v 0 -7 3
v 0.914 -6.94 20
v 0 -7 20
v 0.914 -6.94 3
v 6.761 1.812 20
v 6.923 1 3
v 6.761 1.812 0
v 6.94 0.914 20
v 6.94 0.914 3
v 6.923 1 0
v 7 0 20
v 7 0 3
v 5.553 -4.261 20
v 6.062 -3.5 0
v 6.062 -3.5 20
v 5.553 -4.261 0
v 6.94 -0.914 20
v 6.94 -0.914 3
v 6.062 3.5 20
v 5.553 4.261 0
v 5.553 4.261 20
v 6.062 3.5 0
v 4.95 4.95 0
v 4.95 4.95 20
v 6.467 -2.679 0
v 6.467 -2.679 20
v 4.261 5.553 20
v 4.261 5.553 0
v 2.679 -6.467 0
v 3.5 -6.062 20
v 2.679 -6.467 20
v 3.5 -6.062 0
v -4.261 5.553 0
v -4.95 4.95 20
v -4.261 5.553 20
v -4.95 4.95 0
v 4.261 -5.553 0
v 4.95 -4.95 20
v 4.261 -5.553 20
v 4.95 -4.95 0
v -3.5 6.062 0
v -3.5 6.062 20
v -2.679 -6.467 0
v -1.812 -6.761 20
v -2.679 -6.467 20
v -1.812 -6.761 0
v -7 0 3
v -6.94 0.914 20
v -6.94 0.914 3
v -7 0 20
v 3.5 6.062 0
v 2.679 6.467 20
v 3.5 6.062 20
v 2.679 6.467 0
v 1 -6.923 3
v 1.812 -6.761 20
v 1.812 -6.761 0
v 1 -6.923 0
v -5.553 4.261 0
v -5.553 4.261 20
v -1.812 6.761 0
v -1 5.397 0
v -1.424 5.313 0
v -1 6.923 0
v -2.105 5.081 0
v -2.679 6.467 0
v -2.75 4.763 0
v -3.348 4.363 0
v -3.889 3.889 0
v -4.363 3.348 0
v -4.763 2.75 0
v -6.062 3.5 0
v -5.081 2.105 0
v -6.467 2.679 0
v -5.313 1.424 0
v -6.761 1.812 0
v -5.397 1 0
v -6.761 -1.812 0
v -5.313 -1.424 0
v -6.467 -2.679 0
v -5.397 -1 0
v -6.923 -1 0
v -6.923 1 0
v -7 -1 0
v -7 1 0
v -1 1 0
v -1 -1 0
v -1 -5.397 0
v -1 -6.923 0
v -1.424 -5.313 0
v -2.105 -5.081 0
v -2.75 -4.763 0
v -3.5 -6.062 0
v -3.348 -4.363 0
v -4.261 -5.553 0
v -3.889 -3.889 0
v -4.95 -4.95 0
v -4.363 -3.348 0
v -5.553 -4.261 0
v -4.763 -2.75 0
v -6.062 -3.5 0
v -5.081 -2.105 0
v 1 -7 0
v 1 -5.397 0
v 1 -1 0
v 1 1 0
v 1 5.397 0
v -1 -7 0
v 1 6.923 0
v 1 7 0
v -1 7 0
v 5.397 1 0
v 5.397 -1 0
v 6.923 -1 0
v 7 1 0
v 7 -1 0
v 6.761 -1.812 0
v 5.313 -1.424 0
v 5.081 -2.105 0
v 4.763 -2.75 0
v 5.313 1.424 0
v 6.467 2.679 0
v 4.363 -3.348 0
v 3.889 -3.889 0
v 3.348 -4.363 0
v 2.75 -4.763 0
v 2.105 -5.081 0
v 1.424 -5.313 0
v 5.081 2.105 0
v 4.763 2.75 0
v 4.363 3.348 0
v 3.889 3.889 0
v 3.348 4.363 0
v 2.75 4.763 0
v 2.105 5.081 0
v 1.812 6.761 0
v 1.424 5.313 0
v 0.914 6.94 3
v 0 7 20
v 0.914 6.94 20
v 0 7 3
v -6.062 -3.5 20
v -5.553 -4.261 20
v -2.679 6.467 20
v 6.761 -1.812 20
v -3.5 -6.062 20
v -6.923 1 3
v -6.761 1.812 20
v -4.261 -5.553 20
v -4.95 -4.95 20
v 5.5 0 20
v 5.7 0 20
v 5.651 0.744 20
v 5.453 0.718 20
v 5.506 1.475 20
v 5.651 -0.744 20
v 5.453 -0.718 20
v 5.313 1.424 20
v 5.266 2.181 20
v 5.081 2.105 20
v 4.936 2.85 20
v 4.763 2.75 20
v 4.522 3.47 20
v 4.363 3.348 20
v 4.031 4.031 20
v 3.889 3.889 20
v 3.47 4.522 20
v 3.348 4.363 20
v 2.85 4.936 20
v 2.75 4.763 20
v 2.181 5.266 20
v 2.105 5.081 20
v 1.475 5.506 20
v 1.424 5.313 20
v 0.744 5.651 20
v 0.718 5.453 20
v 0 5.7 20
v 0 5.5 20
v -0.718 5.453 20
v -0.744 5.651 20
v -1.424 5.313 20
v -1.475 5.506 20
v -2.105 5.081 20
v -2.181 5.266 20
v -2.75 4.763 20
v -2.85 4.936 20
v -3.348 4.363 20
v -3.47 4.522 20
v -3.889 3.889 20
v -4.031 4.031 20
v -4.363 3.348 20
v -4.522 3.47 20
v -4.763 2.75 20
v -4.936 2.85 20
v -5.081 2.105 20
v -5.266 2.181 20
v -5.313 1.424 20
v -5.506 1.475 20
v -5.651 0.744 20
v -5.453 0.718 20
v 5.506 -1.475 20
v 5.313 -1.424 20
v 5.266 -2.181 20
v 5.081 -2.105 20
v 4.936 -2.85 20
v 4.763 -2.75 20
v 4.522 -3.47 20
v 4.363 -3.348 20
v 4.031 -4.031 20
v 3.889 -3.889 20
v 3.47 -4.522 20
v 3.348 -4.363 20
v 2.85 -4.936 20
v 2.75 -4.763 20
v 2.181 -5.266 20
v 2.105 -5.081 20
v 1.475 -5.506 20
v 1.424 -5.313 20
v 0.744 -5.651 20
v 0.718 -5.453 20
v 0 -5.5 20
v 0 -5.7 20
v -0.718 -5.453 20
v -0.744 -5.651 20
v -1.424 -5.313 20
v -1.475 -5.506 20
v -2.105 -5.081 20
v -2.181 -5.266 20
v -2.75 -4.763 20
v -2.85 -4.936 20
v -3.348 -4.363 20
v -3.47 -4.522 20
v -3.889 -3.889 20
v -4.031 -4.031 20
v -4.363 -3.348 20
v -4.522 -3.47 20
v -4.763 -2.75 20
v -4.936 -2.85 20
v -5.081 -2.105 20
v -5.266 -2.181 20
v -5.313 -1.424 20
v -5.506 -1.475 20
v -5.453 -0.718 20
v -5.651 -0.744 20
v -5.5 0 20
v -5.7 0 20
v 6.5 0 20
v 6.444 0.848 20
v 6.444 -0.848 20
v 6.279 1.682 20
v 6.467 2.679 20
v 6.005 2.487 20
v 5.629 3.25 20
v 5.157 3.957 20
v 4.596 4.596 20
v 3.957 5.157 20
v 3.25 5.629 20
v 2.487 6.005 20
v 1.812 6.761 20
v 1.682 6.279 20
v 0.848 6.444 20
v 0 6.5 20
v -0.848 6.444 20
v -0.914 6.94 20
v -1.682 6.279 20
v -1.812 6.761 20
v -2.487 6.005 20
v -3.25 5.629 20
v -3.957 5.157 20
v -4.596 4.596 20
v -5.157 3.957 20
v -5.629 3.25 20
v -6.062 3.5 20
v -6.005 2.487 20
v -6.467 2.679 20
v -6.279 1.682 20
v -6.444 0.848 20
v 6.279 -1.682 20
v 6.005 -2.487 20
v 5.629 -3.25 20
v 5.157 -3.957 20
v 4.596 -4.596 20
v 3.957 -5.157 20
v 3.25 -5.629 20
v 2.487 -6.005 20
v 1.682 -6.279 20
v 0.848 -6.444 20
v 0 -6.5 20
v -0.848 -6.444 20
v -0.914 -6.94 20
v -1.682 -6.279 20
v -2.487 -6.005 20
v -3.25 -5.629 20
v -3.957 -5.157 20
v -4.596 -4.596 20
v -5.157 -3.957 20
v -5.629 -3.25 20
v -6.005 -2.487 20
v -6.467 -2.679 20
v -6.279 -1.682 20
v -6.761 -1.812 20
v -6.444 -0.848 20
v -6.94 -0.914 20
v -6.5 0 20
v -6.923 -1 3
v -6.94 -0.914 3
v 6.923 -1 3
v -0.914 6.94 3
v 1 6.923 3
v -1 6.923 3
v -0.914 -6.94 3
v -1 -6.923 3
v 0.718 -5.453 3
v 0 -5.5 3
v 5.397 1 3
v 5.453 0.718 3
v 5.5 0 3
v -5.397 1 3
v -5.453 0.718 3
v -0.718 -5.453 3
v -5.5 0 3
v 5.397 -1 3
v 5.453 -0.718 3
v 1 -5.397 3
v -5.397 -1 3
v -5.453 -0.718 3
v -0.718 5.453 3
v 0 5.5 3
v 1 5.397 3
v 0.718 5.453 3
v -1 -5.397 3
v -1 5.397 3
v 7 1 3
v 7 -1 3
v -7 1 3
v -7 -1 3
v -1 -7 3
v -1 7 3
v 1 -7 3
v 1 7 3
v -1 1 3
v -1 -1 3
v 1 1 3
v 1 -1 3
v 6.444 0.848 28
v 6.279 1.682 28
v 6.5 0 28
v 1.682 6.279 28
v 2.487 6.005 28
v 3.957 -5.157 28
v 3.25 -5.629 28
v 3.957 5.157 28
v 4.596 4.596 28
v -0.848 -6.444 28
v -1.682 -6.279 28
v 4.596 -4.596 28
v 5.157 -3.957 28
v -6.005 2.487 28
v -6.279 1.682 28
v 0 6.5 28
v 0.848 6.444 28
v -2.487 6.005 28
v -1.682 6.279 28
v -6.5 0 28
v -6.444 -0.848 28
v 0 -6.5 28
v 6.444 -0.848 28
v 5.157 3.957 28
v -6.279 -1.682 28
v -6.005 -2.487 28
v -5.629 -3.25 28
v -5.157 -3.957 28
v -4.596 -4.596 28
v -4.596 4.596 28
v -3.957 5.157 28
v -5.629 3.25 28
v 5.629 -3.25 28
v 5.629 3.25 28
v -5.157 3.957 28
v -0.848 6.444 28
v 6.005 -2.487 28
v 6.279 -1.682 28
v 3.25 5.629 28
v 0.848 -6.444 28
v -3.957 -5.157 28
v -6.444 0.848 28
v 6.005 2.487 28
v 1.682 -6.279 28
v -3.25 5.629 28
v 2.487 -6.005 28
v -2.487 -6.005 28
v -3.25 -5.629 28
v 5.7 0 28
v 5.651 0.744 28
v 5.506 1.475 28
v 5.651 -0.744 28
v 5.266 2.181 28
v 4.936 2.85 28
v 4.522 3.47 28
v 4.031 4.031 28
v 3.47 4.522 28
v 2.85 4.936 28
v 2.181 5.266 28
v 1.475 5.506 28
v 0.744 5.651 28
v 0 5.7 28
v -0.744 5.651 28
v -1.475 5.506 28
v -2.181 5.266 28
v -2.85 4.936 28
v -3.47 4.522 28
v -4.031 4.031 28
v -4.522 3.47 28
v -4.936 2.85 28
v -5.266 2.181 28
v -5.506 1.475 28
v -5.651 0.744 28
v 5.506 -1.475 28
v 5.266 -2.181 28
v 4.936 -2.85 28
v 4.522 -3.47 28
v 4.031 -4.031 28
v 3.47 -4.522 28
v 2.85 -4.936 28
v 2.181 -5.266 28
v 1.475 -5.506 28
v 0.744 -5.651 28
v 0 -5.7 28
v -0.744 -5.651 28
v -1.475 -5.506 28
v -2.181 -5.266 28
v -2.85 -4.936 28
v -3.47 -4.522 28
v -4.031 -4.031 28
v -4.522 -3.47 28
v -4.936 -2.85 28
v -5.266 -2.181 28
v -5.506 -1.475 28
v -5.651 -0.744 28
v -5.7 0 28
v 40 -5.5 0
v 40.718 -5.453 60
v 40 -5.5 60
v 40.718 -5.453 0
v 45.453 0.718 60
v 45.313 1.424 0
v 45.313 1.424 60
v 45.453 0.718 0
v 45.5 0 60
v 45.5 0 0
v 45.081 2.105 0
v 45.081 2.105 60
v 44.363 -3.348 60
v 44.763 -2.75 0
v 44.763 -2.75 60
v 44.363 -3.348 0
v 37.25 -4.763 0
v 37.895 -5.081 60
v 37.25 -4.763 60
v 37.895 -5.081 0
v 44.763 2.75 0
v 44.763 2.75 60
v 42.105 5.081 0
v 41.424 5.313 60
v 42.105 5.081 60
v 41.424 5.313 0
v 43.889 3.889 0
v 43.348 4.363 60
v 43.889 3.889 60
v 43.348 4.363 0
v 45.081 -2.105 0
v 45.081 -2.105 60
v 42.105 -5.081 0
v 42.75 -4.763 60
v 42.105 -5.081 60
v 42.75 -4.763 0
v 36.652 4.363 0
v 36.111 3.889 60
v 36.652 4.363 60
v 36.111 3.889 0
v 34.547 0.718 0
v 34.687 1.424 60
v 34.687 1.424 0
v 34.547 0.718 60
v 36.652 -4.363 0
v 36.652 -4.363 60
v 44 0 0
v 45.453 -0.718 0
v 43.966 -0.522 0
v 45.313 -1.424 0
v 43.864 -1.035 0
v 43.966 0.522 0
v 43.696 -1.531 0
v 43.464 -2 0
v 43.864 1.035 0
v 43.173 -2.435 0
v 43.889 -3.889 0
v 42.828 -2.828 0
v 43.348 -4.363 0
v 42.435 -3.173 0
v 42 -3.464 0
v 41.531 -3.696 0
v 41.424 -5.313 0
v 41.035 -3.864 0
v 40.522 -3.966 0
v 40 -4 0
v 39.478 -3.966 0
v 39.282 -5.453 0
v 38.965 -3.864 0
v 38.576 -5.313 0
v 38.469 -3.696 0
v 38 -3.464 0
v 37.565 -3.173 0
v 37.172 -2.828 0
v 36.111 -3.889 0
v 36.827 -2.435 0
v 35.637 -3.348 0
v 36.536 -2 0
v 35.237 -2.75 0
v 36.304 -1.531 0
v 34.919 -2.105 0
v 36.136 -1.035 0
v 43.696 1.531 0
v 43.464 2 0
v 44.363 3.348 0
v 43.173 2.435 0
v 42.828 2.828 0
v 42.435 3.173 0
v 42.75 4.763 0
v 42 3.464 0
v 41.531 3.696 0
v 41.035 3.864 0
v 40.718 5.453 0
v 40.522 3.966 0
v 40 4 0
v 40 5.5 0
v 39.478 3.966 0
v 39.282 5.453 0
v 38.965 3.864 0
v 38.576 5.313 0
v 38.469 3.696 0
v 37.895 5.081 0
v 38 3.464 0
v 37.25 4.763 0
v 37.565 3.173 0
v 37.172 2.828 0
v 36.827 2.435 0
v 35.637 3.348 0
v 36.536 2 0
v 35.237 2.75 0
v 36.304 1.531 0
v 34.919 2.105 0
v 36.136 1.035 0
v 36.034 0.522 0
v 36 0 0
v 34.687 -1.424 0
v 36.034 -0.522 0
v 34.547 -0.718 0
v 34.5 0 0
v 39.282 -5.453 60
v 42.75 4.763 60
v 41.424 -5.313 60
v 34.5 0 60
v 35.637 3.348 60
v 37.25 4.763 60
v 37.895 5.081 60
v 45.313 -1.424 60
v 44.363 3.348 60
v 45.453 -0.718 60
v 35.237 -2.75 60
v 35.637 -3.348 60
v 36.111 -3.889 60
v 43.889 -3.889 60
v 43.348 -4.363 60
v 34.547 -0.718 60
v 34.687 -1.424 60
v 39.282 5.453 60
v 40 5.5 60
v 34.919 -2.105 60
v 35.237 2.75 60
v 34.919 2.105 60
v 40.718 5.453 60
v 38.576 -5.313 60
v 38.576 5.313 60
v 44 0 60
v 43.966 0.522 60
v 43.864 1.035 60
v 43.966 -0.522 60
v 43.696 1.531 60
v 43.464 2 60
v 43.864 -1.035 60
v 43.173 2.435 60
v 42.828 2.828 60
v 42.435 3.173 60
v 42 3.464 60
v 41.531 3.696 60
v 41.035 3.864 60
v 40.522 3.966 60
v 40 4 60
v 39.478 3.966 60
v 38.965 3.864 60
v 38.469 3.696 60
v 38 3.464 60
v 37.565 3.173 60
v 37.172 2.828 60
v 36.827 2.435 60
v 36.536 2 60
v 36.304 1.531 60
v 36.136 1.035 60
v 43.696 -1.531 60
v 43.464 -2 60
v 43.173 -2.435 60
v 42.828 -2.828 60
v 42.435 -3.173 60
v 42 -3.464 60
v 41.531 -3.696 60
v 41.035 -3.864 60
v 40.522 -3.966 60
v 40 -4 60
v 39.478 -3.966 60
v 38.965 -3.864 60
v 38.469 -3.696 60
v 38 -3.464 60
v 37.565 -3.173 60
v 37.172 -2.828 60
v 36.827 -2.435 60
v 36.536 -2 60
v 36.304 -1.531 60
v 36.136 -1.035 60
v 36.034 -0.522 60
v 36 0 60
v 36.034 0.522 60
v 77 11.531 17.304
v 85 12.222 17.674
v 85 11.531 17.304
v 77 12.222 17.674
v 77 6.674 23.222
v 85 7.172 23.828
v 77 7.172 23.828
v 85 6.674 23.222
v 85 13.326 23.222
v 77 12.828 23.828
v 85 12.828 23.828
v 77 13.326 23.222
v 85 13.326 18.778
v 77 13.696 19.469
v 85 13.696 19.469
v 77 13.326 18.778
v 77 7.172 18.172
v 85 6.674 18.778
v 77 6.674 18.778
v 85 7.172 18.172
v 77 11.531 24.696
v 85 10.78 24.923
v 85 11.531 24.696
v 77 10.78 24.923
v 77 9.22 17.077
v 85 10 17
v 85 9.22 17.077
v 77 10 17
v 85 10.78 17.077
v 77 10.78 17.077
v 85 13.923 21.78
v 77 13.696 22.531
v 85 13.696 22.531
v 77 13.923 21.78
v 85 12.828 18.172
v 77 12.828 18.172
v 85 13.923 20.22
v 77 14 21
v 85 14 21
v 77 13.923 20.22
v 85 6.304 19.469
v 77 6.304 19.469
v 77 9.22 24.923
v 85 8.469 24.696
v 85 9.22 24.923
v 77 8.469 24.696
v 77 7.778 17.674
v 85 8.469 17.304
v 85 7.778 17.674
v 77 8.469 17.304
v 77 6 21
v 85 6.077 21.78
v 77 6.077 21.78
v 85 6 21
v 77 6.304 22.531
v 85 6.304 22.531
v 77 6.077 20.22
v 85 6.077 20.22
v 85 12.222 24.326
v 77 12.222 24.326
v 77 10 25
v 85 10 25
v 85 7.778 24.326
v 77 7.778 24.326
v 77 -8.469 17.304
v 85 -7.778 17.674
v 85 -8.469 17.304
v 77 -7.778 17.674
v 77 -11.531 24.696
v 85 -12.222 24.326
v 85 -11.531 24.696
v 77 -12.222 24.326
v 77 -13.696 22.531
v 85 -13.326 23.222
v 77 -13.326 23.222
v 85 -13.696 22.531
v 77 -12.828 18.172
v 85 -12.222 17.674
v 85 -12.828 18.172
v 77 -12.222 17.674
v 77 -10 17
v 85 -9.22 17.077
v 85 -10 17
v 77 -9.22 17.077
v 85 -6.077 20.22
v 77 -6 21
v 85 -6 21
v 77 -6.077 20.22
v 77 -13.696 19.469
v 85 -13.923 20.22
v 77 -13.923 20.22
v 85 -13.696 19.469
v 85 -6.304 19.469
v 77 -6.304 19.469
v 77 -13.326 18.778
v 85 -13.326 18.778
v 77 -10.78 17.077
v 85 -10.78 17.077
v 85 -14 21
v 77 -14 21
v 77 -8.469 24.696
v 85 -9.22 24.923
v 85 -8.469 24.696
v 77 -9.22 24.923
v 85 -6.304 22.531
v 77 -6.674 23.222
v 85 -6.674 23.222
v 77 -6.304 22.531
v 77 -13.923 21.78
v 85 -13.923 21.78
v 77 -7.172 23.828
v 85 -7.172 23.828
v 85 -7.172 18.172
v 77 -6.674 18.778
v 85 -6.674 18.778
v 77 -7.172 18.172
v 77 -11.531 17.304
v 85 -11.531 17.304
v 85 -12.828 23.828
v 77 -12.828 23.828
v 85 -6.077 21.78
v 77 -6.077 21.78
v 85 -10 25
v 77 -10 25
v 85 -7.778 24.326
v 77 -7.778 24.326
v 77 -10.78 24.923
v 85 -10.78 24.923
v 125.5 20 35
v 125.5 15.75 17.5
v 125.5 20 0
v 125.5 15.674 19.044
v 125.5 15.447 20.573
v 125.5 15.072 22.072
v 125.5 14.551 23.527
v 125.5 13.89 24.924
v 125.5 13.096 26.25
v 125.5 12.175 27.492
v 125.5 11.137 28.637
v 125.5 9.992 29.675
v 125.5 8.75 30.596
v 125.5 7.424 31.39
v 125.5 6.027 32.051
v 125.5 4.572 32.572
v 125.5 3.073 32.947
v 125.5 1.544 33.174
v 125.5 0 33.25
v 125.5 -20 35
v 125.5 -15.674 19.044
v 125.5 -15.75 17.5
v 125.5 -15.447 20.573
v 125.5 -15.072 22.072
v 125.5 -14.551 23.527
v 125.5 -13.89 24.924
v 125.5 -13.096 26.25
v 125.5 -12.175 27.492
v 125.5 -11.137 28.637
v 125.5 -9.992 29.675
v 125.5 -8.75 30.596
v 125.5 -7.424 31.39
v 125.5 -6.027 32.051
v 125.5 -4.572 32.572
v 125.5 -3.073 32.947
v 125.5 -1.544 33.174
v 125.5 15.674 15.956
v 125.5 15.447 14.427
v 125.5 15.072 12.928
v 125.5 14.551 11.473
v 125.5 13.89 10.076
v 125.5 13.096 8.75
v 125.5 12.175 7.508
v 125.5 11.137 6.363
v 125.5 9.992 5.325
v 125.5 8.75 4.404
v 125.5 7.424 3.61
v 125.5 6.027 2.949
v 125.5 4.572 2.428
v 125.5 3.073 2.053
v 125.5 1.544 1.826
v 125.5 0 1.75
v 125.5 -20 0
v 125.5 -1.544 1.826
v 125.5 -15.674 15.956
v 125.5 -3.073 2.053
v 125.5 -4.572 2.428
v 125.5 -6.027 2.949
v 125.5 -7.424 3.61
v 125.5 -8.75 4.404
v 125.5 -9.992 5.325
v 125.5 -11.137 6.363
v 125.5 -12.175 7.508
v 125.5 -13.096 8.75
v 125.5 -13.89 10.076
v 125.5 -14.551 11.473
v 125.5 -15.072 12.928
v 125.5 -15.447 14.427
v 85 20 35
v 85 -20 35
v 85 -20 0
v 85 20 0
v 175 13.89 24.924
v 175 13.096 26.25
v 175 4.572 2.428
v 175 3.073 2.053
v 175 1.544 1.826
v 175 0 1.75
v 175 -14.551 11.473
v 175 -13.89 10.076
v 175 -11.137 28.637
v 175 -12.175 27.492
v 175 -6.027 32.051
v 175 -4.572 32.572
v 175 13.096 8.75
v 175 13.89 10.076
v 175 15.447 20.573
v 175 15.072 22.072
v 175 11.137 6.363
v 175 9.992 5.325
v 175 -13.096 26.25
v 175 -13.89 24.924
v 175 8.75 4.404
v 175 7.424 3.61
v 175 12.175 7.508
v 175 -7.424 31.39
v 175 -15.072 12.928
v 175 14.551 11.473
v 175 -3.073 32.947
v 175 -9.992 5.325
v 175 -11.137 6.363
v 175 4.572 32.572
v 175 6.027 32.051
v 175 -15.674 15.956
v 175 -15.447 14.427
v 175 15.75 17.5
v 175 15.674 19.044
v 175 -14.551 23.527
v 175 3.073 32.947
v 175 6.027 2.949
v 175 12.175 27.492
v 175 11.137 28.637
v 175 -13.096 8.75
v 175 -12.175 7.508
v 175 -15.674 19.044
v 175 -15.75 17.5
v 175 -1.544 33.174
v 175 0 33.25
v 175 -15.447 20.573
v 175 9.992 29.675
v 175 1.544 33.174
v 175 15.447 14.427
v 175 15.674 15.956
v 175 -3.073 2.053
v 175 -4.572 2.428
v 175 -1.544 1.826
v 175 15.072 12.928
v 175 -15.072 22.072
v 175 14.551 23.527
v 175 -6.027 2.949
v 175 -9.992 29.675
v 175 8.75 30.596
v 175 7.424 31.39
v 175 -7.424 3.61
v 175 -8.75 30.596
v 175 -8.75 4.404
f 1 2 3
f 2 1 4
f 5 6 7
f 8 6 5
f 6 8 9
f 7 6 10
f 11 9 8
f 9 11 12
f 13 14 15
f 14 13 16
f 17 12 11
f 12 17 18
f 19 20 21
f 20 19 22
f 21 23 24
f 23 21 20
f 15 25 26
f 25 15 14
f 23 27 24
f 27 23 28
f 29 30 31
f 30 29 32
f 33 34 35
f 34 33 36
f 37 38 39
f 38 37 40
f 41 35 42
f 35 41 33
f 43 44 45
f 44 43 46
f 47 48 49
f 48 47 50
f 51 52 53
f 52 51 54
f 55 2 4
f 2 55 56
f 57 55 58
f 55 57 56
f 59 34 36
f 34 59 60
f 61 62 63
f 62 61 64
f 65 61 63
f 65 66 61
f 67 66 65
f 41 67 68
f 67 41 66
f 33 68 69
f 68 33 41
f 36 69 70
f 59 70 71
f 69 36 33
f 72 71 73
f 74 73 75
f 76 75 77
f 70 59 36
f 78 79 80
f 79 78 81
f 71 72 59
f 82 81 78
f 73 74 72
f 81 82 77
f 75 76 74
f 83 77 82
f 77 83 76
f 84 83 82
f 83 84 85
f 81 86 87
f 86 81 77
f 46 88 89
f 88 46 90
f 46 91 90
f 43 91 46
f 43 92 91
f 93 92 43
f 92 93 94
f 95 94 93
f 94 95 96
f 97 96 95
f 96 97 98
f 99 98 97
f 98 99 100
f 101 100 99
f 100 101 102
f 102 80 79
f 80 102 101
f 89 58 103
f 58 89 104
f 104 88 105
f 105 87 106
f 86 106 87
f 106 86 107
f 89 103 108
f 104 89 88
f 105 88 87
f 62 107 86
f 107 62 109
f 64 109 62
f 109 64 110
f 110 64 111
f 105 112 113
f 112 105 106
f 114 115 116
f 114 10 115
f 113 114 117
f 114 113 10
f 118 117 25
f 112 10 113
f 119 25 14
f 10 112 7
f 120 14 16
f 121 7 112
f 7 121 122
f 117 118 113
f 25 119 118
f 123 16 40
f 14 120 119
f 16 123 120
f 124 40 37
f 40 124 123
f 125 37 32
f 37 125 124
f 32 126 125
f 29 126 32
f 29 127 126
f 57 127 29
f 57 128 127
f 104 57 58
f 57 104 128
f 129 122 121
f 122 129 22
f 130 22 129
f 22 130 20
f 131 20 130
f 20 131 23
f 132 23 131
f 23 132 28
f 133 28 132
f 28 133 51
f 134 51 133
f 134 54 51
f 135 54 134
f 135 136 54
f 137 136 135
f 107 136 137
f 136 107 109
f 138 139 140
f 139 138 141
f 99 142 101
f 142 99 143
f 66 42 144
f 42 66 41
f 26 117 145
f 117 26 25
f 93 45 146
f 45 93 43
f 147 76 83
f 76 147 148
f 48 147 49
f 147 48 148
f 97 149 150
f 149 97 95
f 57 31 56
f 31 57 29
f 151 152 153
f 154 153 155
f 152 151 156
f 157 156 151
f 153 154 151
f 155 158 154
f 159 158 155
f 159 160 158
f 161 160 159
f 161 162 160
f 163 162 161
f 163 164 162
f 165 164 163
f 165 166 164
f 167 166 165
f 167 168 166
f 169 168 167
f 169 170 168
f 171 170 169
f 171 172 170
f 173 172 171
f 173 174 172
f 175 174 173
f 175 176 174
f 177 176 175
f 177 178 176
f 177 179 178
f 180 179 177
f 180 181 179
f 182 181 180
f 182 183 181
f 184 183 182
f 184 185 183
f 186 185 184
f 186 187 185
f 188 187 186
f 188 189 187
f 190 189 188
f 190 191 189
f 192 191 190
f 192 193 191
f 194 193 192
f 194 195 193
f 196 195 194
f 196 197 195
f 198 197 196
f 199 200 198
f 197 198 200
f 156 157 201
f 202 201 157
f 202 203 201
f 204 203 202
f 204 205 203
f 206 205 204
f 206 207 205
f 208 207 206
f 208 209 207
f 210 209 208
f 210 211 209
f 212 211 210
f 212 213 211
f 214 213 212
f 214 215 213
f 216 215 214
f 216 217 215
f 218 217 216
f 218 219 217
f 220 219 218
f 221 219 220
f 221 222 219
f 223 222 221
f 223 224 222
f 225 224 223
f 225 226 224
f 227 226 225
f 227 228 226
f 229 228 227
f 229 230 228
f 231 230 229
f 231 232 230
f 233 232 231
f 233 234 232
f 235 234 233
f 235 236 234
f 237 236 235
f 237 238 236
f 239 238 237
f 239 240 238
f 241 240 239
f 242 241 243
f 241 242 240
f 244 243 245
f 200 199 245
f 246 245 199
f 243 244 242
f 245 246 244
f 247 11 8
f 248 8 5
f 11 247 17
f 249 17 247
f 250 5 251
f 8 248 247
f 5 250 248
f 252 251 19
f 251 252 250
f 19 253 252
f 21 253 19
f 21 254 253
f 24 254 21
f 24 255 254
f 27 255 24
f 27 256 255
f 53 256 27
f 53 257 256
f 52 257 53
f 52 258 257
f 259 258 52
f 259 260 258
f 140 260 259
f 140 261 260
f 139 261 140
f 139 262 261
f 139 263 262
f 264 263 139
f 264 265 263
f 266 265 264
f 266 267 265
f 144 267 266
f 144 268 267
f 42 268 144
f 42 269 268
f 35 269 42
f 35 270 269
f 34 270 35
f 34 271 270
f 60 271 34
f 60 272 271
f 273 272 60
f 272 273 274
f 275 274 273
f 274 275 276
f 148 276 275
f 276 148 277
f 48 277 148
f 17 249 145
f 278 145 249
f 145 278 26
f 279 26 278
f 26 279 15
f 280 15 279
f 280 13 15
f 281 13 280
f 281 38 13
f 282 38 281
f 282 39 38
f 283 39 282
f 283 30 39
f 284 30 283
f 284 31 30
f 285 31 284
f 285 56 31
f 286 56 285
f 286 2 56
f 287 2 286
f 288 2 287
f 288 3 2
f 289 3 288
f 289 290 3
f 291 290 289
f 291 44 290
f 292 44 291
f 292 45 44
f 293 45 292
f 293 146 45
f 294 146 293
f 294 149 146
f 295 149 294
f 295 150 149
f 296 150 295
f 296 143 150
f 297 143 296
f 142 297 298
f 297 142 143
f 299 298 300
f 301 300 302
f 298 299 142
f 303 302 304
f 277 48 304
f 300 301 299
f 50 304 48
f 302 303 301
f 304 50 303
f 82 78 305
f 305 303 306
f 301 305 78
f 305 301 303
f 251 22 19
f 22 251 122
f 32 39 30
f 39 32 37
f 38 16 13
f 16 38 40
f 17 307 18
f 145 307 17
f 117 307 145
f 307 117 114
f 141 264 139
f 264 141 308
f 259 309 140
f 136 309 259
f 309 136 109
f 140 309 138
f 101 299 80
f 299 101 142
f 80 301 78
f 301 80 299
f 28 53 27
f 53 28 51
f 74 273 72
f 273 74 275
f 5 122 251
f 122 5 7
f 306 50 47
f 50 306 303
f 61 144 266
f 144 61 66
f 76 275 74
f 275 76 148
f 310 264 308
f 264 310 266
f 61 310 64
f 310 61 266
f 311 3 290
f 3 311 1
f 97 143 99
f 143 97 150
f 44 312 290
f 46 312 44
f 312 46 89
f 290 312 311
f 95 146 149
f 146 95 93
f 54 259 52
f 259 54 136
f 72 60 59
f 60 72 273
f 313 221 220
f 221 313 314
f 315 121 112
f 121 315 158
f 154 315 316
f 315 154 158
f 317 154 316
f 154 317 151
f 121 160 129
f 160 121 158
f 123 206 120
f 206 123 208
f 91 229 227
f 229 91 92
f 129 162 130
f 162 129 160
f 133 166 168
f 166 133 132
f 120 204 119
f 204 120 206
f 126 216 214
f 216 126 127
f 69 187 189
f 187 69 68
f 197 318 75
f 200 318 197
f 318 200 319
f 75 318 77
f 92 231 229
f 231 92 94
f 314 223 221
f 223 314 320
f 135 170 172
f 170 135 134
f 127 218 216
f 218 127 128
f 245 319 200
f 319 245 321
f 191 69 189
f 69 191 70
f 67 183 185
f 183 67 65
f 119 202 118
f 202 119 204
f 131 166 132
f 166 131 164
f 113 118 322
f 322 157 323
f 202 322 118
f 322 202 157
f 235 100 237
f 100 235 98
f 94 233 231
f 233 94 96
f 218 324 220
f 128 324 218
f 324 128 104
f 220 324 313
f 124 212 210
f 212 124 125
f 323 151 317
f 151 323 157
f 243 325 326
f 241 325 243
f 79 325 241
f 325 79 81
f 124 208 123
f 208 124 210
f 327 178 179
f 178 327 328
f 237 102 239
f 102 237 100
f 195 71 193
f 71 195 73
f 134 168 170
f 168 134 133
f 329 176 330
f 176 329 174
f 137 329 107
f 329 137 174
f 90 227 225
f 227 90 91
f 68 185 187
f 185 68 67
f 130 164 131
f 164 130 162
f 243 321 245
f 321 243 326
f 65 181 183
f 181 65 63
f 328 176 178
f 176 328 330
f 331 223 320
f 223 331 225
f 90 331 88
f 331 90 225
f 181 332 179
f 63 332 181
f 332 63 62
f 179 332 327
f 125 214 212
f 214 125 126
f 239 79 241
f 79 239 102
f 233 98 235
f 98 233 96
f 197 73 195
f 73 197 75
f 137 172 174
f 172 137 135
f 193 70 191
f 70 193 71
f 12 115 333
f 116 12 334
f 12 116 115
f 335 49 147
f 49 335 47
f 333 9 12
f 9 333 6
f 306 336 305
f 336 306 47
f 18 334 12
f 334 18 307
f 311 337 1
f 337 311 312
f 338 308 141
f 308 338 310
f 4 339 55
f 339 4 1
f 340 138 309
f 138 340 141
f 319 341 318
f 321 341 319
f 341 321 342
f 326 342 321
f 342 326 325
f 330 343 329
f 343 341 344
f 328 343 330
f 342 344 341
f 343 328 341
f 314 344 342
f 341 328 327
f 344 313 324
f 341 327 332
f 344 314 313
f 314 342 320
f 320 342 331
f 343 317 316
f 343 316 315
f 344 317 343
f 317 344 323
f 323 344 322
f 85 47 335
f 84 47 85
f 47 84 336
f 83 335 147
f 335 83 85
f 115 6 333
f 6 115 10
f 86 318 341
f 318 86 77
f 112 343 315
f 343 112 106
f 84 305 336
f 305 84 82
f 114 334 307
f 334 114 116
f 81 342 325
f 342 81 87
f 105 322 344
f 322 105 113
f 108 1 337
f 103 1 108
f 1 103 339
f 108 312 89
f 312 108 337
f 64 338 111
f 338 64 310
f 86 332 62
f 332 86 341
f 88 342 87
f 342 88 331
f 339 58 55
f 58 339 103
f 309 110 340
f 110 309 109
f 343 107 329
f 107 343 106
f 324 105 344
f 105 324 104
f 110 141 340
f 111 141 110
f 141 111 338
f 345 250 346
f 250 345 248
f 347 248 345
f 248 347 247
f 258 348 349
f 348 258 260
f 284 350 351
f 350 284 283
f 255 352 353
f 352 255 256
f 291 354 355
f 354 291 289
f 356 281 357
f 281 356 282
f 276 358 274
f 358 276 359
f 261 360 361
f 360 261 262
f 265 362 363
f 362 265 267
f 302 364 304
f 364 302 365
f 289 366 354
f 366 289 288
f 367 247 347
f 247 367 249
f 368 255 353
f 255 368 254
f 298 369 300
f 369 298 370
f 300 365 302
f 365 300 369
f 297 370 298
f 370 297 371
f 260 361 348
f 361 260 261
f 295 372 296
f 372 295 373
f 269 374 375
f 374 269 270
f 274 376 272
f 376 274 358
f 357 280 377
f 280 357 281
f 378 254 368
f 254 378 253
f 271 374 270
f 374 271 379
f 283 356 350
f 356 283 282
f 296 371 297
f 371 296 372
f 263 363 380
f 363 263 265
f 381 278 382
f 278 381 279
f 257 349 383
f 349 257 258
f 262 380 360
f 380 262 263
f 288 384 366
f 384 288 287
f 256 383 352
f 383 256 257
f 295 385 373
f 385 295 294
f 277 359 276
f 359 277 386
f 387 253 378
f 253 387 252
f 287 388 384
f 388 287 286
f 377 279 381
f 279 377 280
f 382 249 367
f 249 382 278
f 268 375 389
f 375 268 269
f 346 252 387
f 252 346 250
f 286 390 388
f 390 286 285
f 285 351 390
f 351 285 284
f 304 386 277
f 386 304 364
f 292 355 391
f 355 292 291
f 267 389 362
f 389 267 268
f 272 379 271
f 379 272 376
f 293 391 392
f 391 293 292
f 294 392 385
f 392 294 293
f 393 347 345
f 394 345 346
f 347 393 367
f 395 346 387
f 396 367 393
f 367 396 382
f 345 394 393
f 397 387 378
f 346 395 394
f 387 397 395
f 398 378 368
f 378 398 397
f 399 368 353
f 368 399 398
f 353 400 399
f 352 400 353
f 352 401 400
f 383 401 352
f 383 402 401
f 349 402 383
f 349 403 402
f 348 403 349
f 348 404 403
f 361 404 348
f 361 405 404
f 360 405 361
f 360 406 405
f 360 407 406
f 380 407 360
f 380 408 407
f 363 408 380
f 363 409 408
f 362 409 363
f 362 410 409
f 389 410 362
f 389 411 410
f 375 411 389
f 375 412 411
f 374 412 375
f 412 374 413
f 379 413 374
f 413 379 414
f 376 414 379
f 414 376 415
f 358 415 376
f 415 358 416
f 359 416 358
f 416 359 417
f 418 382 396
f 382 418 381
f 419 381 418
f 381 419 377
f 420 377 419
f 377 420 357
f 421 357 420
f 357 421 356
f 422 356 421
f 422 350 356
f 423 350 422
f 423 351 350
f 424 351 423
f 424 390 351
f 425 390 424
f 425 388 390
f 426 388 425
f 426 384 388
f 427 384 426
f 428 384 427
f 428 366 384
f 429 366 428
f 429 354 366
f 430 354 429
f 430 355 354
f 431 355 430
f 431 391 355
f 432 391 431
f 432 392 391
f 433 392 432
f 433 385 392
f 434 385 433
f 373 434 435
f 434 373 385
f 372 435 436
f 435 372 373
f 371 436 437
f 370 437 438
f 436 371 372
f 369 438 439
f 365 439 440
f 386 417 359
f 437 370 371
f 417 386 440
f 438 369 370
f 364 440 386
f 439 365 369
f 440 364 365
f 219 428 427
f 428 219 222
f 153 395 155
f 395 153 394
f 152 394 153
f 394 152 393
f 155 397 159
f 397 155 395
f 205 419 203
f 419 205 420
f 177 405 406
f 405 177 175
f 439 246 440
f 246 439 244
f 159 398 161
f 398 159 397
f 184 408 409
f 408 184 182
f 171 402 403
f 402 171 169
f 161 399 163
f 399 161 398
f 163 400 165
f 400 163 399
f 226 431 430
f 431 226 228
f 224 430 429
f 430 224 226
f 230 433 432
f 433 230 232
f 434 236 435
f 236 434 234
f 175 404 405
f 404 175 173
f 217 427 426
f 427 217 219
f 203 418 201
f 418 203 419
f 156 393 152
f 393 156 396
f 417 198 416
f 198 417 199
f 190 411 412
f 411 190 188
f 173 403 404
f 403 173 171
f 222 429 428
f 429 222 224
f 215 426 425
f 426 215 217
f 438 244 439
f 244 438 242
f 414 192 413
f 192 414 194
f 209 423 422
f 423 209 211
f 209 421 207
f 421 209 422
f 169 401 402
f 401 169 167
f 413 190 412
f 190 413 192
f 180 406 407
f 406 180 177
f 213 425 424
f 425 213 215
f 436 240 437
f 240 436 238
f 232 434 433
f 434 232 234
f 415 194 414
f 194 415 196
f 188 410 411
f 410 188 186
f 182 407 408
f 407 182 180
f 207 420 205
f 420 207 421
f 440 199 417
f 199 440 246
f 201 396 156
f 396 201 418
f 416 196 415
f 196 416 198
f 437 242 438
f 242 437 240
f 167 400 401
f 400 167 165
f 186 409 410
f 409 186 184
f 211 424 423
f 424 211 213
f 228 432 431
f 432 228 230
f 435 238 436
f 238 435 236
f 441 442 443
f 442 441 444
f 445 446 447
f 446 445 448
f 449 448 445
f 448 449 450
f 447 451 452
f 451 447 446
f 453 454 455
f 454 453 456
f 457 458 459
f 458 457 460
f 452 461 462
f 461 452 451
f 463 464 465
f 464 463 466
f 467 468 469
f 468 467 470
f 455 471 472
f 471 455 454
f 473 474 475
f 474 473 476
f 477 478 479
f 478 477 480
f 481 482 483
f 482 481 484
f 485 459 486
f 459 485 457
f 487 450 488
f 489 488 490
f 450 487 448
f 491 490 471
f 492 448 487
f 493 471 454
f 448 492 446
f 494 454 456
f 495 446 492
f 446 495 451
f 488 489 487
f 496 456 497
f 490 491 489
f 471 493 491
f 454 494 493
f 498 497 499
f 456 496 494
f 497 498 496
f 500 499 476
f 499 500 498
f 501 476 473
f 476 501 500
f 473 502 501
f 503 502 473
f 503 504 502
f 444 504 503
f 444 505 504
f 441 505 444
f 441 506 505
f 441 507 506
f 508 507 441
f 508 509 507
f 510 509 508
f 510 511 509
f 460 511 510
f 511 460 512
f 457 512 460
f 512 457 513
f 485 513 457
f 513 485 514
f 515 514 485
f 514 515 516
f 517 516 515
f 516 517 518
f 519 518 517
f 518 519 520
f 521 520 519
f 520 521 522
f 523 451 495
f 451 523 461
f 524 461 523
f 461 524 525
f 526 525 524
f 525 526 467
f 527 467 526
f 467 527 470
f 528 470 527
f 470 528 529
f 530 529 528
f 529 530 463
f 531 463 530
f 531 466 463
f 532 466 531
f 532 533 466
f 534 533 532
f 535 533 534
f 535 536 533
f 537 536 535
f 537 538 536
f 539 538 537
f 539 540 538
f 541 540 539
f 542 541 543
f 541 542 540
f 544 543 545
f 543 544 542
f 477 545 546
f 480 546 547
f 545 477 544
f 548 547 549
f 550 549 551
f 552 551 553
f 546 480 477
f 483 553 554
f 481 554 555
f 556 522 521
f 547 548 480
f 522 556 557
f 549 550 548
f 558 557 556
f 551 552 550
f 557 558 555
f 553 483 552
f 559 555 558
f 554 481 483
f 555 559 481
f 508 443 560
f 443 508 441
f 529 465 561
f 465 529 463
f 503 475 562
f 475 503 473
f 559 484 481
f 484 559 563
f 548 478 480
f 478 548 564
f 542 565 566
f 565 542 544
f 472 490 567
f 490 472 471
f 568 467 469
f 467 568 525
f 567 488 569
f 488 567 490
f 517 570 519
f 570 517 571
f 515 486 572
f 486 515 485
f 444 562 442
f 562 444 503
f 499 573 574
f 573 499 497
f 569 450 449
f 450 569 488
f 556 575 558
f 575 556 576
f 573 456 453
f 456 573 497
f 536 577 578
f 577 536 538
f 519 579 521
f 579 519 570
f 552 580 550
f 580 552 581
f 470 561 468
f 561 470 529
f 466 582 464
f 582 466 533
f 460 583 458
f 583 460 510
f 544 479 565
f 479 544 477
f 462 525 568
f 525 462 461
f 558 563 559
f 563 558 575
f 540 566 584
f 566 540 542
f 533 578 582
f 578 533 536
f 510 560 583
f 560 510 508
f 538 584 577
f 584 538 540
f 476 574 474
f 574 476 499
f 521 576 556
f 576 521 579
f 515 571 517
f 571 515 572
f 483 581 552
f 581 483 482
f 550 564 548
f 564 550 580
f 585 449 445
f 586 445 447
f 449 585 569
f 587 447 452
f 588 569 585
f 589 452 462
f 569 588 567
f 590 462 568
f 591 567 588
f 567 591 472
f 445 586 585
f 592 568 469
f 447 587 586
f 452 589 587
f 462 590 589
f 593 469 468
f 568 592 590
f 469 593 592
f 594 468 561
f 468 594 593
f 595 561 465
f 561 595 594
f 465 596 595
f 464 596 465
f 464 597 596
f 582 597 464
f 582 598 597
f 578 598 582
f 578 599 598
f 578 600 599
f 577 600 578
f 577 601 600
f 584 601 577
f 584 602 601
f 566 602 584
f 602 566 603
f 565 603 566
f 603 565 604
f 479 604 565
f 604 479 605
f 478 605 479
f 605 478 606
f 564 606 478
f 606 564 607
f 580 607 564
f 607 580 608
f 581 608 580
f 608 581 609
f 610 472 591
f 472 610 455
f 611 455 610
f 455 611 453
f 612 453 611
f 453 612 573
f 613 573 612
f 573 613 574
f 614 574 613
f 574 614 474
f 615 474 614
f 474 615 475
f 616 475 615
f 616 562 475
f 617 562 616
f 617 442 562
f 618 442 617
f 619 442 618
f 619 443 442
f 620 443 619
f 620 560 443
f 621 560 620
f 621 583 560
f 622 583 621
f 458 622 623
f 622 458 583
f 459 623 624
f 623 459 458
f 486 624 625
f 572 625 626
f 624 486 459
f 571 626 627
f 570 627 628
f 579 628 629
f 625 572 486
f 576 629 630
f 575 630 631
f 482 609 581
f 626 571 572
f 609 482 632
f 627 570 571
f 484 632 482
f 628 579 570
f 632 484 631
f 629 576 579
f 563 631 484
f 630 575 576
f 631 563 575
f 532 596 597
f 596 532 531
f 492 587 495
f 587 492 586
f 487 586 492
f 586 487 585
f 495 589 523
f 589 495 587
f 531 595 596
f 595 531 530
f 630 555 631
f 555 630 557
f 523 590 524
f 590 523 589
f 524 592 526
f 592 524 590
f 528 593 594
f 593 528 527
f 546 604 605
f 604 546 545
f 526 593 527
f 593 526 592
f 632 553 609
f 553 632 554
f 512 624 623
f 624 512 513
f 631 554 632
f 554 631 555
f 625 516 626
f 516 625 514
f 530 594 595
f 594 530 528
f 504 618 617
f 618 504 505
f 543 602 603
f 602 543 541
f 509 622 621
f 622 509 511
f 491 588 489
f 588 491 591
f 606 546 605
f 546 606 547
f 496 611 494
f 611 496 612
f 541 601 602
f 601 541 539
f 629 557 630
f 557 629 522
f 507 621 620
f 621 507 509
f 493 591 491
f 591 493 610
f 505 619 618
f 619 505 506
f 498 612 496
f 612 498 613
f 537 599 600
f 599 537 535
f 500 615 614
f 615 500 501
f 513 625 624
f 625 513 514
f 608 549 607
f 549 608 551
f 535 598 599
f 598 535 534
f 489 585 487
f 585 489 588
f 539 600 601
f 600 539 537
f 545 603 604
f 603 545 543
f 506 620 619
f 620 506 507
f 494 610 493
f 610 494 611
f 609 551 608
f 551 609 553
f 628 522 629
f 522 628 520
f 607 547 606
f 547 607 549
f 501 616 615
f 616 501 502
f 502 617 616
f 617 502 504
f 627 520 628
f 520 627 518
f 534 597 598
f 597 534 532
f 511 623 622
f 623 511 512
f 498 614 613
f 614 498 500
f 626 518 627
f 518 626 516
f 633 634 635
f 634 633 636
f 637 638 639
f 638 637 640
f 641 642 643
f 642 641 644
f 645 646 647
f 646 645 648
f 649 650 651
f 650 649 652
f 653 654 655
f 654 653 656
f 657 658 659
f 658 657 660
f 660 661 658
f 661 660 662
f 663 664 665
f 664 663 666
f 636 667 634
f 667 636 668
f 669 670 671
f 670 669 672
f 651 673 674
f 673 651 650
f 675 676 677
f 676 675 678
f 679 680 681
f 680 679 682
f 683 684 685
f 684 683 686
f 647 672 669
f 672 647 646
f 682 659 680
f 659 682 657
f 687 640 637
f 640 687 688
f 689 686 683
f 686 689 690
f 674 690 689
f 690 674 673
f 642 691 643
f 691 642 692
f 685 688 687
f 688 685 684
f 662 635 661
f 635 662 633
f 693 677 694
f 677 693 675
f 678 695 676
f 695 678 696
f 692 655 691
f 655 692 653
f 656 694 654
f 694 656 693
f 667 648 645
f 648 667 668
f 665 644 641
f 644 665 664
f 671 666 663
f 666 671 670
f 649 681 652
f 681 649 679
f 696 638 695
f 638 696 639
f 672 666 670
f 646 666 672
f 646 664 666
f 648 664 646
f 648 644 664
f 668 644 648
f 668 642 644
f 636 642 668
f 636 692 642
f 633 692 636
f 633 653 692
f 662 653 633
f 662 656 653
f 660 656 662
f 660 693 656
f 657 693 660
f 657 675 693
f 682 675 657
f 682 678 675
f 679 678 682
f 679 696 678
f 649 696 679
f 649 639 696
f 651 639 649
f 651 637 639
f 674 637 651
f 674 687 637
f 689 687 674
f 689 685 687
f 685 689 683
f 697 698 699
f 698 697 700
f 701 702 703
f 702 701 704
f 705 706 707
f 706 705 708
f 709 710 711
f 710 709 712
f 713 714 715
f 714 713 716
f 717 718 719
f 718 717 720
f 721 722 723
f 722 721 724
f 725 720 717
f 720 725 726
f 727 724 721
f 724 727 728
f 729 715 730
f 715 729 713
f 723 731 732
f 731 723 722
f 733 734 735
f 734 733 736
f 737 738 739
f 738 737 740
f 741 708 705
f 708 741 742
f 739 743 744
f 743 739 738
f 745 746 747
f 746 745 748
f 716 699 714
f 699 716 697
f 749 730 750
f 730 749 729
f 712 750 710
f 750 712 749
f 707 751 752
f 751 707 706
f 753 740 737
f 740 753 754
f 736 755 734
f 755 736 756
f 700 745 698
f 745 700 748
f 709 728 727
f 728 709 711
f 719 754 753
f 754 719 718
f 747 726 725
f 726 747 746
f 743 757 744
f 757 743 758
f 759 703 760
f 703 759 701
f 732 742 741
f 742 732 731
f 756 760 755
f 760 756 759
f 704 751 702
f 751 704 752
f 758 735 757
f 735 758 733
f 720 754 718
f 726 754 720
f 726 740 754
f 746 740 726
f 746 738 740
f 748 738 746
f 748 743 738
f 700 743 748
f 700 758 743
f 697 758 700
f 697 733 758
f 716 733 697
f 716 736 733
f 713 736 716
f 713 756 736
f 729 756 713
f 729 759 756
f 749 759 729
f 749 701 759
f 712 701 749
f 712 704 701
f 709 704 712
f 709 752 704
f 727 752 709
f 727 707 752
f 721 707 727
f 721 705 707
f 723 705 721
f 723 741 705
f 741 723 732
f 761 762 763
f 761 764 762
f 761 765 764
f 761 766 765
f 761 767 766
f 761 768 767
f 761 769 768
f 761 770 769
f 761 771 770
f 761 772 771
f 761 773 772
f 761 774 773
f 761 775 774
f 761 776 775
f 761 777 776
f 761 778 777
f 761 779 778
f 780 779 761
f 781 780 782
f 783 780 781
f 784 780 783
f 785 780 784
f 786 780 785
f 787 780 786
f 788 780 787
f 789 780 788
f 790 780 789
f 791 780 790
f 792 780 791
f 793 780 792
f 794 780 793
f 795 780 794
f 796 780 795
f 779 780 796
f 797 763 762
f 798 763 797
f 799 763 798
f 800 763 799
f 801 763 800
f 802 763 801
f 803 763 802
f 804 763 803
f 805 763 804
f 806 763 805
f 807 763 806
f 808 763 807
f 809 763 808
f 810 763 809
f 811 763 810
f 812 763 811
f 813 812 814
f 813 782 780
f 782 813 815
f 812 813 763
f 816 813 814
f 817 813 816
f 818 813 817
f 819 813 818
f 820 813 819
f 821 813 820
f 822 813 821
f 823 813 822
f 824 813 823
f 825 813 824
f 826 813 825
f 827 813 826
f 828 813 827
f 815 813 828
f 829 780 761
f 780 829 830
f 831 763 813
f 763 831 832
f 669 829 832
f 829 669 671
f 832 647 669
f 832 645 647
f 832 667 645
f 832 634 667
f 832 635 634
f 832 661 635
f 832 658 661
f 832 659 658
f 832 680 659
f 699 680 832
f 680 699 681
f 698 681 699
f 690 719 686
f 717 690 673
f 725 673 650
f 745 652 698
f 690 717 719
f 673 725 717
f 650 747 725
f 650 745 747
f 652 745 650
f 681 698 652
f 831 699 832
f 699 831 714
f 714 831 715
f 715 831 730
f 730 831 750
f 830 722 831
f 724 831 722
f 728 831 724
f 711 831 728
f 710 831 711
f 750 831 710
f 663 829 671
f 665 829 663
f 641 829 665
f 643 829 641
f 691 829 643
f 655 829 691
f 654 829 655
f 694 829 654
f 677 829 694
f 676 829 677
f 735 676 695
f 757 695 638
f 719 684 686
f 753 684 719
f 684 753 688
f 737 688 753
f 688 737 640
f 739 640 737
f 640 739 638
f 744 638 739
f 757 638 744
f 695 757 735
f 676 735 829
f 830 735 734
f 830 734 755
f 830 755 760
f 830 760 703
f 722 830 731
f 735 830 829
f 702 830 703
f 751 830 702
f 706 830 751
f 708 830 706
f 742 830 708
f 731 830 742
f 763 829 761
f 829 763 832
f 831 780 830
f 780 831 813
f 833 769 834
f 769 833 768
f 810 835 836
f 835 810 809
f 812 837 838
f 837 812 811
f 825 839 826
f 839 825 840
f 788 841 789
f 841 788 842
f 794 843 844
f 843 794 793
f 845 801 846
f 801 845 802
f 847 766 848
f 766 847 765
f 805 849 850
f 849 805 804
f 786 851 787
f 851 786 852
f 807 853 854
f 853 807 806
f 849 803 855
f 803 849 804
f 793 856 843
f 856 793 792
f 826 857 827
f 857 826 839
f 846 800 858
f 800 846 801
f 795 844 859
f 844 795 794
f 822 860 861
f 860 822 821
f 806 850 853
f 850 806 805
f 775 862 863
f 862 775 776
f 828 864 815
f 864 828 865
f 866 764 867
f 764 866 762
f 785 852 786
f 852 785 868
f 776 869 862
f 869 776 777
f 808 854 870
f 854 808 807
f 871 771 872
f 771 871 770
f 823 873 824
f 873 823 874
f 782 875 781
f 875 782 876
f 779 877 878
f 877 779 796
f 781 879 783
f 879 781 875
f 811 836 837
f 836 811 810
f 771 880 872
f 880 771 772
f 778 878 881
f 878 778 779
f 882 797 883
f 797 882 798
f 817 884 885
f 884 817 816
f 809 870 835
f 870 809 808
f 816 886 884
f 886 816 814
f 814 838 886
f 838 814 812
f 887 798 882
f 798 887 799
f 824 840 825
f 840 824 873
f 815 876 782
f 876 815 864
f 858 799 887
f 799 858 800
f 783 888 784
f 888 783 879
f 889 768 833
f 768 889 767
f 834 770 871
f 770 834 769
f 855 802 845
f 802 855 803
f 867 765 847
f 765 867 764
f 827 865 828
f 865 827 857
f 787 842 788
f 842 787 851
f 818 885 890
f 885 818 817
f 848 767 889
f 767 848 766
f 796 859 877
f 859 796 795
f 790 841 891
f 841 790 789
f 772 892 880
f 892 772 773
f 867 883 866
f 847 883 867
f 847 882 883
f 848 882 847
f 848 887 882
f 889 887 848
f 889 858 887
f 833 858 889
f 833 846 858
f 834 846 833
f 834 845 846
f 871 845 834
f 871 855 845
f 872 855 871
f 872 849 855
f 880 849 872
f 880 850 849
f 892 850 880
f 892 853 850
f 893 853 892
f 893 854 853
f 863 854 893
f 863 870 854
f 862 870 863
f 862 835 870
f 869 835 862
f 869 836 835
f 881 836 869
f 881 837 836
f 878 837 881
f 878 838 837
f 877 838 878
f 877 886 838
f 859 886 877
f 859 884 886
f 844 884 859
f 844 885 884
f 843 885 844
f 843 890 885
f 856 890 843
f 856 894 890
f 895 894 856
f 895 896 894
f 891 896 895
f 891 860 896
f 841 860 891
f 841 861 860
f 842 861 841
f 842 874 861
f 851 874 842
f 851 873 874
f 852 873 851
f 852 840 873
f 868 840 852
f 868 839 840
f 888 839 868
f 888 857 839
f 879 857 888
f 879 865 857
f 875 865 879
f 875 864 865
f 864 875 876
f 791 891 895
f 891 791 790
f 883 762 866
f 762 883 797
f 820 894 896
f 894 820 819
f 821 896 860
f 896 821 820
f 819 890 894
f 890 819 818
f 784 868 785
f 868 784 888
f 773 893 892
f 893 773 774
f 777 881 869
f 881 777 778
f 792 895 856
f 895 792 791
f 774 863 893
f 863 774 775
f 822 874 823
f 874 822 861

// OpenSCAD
// ============================================================================
// accessories_001.scad — Phụ kiện: lưới lọc thô + ống silicone + bơm RS365
// ----------------------------------------------------------------------------
// - prescreen(): lưới lọc thô khe >5mm cắm ĐẦU NGUỒN (chỉ chặn rác to lá/cành,
//   KHÔNG lọc mất hạt 1–5mm cần đo). Chi tiết in nhỏ, nối tiếp ống vào.
// - silicone_tube(): mô phỏng ống ID8/OD11 (G4: trùm ngạnh OD8) — đi dây assembly.
// - pump_rs365(): PLACEHOLDER bơm màng RS365 12V MUA SẴN (bbox ~90×40×35 + 2 ngạnh
//   OD8). Chỉ để bố trí trạm bơm TÁCH RỜI (cách rung) — KHÔNG in, KHÔNG chi tiết.
// ============================================================================
include <../constants.scad>

// Lưới lọc thô: ống lồng Ø14 dài 20, đầu vào chia khe 6mm bởi 2 gân chữ thập
module prescreen() {
    color(col_plastic) {
        difference() {
            cylinder(d = 14, h = 20, $fn = 48);
            translate([0, 0, -0.5]) cylinder(d = 11, h = 21, $fn = 48);
        }
        // Chữ thập chắn ở miệng (tạo khe ~6mm > 5mm — hạt đo lọt, rác to bị chặn)
        for (a = [0, 90])
            rotate([0, 0, a]) translate([-7, -1, 0]) cube([14, 2, 3]);
        // Cổ nối trùm ngạnh/ống
        translate([0, 0, 20]) difference() {
            cylinder(d = sil_tube_od + 2, h = 8, $fn = 48);
            translate([0, 0, -0.5]) cylinder(d = sil_tube_od + 2*tol, h = 9, $fn = 48);
        }
    }
}

// Ống silicone (mô phỏng đoạn thẳng; assembly có thể xếp nhiều đoạn gấp khúc)
module silicone_tube(len = 60) {
    color([0.95, 0.95, 0.95, 0.55]) difference() {
        cylinder(d = sil_tube_od, h = len, $fn = 48);
        translate([0, 0, -0.5]) cylinder(d = sil_tube_id, h = len + 1, $fn = 48);
    }
}

// Bơm màng RS365 (placeholder): thân hộp + motor trụ + 2 ngạnh OD8 một đầu
module pump_rs365() {
    L = pump_bbox[0]; W = pump_bbox[1]; H = pump_bbox[2];
    // Đầu bơm màng (hộp)
    color(col_plastic) translate([-L/2, -W/2, 0]) cube([L*0.45, W, H]);
    // Thân motor RS365 (trụ)
    color(col_metal) translate([-L/2 + L*0.45, 0, H/2])
        rotate([0, 90, 0]) cylinder(d = H*0.9, h = L*0.55, $fn = 64);
    // 2 ngạnh vào/ra (OD8) trên đầu bơm
    color(col_plastic) for (sy = [1, -1])
        translate([-L/2 - 8, sy * W/4, H*0.6])
            rotate([0, 90, 0]) cylinder(d = pump_barb_od, h = 10, $fn = 32);
}

// Xem lẻ
prescreen();
translate([40, 0, 0]) silicone_tube();
translate([130, 0, 0]) pump_rs365();
